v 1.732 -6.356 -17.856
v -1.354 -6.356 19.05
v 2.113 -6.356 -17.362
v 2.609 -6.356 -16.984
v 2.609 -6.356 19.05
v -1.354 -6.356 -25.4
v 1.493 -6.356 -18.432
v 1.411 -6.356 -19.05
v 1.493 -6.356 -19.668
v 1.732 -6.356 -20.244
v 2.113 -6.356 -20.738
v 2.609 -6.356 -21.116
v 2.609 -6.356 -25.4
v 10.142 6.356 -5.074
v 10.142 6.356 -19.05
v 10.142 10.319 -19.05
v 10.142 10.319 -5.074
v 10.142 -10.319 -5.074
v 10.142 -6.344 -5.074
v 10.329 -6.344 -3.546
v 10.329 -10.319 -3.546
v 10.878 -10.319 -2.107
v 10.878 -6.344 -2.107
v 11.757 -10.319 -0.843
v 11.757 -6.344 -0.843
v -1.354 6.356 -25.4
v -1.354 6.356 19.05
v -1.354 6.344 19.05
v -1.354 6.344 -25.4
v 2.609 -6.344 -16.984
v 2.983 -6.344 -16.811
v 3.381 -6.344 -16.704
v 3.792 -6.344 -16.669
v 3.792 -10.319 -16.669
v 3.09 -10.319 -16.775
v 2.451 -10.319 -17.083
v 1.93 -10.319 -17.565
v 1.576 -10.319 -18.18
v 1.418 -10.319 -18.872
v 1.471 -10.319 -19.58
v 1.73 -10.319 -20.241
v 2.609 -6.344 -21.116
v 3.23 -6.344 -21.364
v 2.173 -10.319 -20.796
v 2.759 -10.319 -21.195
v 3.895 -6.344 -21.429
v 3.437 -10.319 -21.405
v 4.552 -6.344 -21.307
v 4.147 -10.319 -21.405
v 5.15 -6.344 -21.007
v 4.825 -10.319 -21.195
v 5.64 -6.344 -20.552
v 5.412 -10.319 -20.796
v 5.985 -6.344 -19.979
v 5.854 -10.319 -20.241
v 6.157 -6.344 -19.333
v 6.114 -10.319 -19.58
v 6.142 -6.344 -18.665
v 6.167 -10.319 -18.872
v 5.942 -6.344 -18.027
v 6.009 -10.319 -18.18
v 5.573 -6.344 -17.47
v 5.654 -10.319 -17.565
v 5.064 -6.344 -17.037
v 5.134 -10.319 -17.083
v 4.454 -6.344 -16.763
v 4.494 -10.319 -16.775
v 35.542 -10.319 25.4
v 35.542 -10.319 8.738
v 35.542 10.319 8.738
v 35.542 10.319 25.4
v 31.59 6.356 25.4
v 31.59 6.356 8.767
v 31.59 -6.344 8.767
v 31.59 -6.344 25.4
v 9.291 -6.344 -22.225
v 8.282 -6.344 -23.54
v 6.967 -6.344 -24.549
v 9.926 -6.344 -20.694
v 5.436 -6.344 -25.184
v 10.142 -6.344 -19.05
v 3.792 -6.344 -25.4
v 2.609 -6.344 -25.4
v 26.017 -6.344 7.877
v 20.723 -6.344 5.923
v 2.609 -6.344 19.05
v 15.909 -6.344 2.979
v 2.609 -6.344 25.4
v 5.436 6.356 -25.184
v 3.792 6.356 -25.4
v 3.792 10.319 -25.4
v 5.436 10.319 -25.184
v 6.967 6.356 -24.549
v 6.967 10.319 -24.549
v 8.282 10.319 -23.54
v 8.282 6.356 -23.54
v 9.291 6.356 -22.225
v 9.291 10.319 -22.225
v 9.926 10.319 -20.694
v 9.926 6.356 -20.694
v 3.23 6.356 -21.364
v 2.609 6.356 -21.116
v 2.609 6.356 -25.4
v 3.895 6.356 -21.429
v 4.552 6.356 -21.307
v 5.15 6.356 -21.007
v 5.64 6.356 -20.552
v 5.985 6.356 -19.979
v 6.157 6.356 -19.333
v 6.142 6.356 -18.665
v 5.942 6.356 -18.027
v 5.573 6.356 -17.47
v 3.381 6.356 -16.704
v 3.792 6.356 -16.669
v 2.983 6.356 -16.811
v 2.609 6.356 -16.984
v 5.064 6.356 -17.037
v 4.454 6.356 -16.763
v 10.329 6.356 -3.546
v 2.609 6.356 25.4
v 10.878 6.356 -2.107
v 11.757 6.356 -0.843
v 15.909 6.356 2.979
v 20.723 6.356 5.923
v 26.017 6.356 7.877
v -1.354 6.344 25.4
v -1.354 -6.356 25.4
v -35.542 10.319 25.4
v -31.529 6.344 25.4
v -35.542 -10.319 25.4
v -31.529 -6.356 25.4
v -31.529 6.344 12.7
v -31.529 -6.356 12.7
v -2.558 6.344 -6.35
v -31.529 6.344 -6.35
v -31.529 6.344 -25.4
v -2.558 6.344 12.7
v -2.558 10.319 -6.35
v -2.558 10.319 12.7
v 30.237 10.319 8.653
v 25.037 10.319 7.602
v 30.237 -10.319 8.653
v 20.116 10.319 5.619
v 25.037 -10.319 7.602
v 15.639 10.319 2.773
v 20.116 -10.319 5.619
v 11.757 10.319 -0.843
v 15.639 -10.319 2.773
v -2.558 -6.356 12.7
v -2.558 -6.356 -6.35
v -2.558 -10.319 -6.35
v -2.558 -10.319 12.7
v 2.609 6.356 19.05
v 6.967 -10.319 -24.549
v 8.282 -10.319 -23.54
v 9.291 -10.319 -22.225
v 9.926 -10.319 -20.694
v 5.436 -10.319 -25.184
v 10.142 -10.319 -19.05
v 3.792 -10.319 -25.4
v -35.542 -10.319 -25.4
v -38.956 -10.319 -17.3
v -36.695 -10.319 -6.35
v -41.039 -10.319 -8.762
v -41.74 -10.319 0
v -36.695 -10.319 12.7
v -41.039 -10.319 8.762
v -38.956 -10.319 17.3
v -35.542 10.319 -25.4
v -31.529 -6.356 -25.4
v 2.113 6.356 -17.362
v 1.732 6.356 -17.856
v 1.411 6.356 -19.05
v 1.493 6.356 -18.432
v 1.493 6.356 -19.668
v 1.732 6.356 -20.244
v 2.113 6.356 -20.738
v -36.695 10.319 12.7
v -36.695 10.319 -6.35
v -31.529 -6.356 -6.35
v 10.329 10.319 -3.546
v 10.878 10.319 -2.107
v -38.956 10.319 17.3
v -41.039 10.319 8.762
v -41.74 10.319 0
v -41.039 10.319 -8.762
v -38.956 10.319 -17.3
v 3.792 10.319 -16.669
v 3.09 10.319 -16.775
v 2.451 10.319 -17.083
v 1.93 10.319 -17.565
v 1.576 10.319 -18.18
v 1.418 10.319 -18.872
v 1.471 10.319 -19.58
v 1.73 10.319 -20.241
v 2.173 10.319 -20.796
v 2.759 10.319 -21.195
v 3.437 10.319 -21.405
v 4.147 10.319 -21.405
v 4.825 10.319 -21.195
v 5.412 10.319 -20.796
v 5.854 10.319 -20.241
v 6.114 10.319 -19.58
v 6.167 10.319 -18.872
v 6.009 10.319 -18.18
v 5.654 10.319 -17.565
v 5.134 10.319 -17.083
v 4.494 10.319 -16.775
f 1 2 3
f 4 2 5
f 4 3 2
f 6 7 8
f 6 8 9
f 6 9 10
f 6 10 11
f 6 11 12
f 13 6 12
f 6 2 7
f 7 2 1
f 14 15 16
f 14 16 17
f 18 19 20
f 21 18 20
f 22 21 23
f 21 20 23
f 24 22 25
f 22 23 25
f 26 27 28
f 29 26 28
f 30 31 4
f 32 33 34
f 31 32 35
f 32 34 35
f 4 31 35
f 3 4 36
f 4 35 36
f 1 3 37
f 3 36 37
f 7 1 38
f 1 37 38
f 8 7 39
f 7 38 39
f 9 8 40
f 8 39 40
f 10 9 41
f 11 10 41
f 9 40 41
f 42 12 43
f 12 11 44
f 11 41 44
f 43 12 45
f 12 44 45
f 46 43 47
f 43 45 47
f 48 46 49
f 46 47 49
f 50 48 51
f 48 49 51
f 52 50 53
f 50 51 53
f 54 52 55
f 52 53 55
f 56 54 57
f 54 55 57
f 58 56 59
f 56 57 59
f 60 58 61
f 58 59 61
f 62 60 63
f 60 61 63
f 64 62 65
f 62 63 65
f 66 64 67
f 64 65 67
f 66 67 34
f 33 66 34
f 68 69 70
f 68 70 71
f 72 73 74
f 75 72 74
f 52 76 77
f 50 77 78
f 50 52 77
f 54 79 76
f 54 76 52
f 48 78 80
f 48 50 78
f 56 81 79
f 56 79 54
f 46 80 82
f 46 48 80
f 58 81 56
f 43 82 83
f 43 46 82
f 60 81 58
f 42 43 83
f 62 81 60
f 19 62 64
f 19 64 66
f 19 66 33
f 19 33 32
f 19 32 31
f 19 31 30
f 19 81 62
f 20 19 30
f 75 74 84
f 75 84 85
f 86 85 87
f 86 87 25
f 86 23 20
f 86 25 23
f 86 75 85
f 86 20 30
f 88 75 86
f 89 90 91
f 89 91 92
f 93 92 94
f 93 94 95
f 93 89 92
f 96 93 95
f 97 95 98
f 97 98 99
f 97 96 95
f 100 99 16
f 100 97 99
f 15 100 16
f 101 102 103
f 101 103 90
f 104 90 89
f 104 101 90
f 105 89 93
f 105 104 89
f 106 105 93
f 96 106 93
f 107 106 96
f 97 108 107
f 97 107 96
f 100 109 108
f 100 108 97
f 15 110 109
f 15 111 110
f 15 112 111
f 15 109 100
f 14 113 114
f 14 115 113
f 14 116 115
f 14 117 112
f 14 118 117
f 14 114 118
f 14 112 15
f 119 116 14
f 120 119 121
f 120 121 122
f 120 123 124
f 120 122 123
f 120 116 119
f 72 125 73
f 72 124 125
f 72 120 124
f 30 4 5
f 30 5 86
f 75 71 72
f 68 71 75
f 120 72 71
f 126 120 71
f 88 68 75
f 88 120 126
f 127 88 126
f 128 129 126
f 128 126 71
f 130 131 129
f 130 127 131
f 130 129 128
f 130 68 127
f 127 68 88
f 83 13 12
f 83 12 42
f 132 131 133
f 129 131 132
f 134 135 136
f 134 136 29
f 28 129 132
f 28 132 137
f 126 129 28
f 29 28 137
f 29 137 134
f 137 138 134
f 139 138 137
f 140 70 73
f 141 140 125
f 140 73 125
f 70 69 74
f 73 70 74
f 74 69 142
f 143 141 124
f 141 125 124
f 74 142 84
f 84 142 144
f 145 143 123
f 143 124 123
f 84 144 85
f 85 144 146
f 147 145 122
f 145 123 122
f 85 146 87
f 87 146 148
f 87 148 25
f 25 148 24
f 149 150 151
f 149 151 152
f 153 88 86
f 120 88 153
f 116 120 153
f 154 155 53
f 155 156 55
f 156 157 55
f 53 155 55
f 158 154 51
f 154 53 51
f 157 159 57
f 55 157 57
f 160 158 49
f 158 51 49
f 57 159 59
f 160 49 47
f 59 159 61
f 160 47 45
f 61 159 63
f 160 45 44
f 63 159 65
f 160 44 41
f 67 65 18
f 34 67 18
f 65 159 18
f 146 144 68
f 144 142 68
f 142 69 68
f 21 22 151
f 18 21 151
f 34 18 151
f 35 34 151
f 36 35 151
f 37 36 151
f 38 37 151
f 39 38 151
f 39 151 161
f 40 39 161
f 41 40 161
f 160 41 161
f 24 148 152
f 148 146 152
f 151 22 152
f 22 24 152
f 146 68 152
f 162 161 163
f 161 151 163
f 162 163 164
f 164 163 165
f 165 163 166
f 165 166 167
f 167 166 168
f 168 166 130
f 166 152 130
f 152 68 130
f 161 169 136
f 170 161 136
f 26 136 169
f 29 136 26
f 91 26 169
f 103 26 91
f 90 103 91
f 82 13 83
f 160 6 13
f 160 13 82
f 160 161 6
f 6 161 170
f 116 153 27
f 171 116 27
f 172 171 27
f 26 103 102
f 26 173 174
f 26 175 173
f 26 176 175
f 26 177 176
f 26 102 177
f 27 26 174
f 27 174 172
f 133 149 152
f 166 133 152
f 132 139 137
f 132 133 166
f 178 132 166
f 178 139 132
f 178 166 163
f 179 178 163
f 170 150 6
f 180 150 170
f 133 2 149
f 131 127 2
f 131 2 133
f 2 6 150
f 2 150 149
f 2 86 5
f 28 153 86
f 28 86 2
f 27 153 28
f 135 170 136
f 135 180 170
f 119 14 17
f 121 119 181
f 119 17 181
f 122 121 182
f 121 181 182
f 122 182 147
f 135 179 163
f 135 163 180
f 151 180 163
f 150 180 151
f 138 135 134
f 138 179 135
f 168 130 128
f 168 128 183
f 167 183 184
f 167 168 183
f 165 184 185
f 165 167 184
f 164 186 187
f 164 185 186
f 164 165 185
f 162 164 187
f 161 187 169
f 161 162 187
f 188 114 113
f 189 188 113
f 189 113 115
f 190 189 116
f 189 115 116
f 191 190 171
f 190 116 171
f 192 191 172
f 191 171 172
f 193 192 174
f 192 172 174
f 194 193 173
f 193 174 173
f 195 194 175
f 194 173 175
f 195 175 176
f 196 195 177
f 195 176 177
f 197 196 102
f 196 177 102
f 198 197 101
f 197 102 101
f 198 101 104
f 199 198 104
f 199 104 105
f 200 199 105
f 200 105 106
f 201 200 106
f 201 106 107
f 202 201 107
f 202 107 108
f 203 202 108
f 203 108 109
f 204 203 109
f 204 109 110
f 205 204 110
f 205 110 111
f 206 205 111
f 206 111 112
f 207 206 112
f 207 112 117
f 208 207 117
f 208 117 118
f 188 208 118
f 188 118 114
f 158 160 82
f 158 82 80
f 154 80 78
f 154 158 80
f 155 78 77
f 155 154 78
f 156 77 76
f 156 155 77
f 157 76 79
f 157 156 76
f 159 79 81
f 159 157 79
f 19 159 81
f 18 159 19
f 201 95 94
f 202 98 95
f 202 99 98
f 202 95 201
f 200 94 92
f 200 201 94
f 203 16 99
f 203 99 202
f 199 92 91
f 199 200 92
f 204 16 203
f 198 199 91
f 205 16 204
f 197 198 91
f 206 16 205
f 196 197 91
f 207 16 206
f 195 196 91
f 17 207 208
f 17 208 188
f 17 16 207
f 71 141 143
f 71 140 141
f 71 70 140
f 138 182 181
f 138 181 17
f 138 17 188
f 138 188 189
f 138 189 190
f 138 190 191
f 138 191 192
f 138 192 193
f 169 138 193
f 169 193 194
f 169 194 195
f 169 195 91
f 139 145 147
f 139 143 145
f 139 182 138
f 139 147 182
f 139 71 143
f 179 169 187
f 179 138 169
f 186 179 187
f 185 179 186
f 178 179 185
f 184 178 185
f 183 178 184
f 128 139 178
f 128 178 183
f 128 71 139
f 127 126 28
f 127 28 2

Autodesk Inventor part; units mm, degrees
ref_plane "YZ Plane" through (0, 0, 0) normal (1, 0, 0) x (0, 1, 0)
ref_plane "XZ Plane" through (0, 0, 0) normal (0, 1, 0) x (-1, 0, 0)
sketch "Sketch1" plane through (0, 0, 0) normal (0, 1, 0) x (-1, 0, 0)
  line L0 (-35.5422, 25.4) -> (35.5422, 25.4)
  line L1 (35.5422, -25.4) -> (-10.1422, -25.4)
  line L2 (-35.5422, 8.7376) -> (-35.5422, 25.4)
  line L3 (-10.1422, -25.4) -> (-10.1422, -2.8194)
  arc A0 (-10.1422, -2.8194) -> (-35.5422, 8.7376) centre (-33.3502, -20.1353) ccw
  line L4 (35.5422, 25.4) -> (35.5422, -25.4) construction
  line L5 (35.5422, 0) -> (41.7398, 0) construction
  arc A1 (35.5422, -25.4) -> (35.5422, 25.4) centre (-13.4082, 0) ccw
  point P0 (0, 0)
  dimension "d2" = 22.5806
  dimension "d3" = 28.956
  dimension "d4" = 16.6624
  dimension "d5" = 50.8
  dimension "d7" = 71.0844
  dimension "d8" = 45.6844
  dimension "d12" = 6.1976
extrude "Extrusion1" add sketch "Sketch1" along normal mid plane 20.6375
fillet "Fillet1" radius 6.35 2 edges at (10.1422, 0, -25.4) (10.1422, 0, -2.8194)
sketch "Sketch2" plane through (0, 10.3188, 0) normal (0, 1, 0) x (1, 0, 0)
  point P0 (0, 0)
sketch "Sketch3" plane through (0, 10.3188, 0) normal (0, 1, 0) x (1, 0, 0)
  line L0 (-36.6954, 6.35) -> (-2.5578, 6.35)
  line L1 (-2.5578, 6.35) -> (-2.5578, -12.7)
  line L2 (-2.5578, -12.7) -> (-36.6954, -12.7)
  line L3 (-36.6954, -12.7) -> (-36.6954, 6.35)
  line L4 (3.7922, 25.4) -> (-35.5422, 25.4) projected
  line L5 (35.5422, -25.4) -> (35.5422, -8.7376) projected
  point P0 (0, 0)
  dimension "d13" = 34.1376
  dimension "d14" = 19.05
  dimension "d15" = 19.05
  dimension "d16" = 38.1
extrude "Extrusion2" cut sketch "Sketch3" against normal through all
sketch "Sketch4" plane through (-35.5422, 10.3188, 25.4) normal (0, 0, 1) x (1, 0, 0)
  line L0 (4.0132, -3.9751) -> (34.1884, -3.9751)
  line L1 (34.1884, -3.9751) -> (34.1884, -16.6751)
  line L2 (34.1884, -16.6751) -> (4.0132, -16.6751)
  line L3 (4.0132, -16.6751) -> (4.0132, -3.9751)
  line L4 (71.0844, -20.6375) -> (0, -20.6375) projected
  line L5 (0, 0) -> (0, -20.6375) projected
  line L6 (38.1508, -3.9624) -> (67.1322, -3.9624)
  line L7 (67.1322, -3.9624) -> (67.1322, -16.6624)
  line L8 (67.1322, -16.6624) -> (38.1508, -16.6624)
  line L9 (38.1508, -16.6624) -> (38.1508, -3.9624)
  line L10 (0, 0) -> (71.0844, 0) projected
  point P0 (35.5422, -10.3188)
  point P1 (34.1884, -10.3251)
  dimension "d19" = 30.1752
  dimension "d20" = 3.9624
  dimension "d21" = 12.7
  dimension "d22" = 4.0132
  dimension "d23" = 3.9624
  dimension "d24" = 28.9814
  dimension "d25" = 3.9624
  dimension "d26" = 12.7
extrude "Extrusion3" cut sketch "Sketch4" against normal through all
sketch "Sketch5" plane through (-35.5422, -10.3188, -25.4) normal (0, 0, -1) x (-1, 0, 0)
  line L0 (-38.1508, 16.6751) -> (-34.1884, 16.6751)
  line L1 (-34.1884, 16.6751) -> (-34.1884, 3.9624)
  line L2 (-34.1884, 3.9624) -> (-38.1508, 3.9624)
  line L3 (-38.1508, 3.9624) -> (-38.1508, 16.6751)
  point P0 (-35.5422, 10.3188)
ref_plane "Work Plane1" through (-35.5422, 10.3188, 19.05) normal (0, 0, 1) x (1, 0, 0)
extrude "Extrusion4" cut sketch "Sketch5" against normal up to surface (44.45 mm away)
sketch "Sketch6" plane through (0, 10.3188, 0) normal (0, 1, 0) x (1, 0, 0)
  arc A0 (10.1422, 19.05) -> (3.7922, 25.4) centre (3.7922, 19.05) ccw projected
  point P0 (0, 0)
hole "Hole1" at (3.7922, 10.3188, -19.05) direction (0, -1, 0) diameter 4.7625 end through all
sketch "Sketch7" plane through (0, 10.3188, 0) normal (0, 1, 0) x (1, 0, 0)
  arc A0 (10.1422, 19.05) -> (3.7922, 25.4) centre (3.7922, 19.05) ccw construction
  line L0 (3.7922, 19.05) -> (3.7922, 25.4) construction
  point P0 (0, 0)
  dimension "d39" = 6.35
